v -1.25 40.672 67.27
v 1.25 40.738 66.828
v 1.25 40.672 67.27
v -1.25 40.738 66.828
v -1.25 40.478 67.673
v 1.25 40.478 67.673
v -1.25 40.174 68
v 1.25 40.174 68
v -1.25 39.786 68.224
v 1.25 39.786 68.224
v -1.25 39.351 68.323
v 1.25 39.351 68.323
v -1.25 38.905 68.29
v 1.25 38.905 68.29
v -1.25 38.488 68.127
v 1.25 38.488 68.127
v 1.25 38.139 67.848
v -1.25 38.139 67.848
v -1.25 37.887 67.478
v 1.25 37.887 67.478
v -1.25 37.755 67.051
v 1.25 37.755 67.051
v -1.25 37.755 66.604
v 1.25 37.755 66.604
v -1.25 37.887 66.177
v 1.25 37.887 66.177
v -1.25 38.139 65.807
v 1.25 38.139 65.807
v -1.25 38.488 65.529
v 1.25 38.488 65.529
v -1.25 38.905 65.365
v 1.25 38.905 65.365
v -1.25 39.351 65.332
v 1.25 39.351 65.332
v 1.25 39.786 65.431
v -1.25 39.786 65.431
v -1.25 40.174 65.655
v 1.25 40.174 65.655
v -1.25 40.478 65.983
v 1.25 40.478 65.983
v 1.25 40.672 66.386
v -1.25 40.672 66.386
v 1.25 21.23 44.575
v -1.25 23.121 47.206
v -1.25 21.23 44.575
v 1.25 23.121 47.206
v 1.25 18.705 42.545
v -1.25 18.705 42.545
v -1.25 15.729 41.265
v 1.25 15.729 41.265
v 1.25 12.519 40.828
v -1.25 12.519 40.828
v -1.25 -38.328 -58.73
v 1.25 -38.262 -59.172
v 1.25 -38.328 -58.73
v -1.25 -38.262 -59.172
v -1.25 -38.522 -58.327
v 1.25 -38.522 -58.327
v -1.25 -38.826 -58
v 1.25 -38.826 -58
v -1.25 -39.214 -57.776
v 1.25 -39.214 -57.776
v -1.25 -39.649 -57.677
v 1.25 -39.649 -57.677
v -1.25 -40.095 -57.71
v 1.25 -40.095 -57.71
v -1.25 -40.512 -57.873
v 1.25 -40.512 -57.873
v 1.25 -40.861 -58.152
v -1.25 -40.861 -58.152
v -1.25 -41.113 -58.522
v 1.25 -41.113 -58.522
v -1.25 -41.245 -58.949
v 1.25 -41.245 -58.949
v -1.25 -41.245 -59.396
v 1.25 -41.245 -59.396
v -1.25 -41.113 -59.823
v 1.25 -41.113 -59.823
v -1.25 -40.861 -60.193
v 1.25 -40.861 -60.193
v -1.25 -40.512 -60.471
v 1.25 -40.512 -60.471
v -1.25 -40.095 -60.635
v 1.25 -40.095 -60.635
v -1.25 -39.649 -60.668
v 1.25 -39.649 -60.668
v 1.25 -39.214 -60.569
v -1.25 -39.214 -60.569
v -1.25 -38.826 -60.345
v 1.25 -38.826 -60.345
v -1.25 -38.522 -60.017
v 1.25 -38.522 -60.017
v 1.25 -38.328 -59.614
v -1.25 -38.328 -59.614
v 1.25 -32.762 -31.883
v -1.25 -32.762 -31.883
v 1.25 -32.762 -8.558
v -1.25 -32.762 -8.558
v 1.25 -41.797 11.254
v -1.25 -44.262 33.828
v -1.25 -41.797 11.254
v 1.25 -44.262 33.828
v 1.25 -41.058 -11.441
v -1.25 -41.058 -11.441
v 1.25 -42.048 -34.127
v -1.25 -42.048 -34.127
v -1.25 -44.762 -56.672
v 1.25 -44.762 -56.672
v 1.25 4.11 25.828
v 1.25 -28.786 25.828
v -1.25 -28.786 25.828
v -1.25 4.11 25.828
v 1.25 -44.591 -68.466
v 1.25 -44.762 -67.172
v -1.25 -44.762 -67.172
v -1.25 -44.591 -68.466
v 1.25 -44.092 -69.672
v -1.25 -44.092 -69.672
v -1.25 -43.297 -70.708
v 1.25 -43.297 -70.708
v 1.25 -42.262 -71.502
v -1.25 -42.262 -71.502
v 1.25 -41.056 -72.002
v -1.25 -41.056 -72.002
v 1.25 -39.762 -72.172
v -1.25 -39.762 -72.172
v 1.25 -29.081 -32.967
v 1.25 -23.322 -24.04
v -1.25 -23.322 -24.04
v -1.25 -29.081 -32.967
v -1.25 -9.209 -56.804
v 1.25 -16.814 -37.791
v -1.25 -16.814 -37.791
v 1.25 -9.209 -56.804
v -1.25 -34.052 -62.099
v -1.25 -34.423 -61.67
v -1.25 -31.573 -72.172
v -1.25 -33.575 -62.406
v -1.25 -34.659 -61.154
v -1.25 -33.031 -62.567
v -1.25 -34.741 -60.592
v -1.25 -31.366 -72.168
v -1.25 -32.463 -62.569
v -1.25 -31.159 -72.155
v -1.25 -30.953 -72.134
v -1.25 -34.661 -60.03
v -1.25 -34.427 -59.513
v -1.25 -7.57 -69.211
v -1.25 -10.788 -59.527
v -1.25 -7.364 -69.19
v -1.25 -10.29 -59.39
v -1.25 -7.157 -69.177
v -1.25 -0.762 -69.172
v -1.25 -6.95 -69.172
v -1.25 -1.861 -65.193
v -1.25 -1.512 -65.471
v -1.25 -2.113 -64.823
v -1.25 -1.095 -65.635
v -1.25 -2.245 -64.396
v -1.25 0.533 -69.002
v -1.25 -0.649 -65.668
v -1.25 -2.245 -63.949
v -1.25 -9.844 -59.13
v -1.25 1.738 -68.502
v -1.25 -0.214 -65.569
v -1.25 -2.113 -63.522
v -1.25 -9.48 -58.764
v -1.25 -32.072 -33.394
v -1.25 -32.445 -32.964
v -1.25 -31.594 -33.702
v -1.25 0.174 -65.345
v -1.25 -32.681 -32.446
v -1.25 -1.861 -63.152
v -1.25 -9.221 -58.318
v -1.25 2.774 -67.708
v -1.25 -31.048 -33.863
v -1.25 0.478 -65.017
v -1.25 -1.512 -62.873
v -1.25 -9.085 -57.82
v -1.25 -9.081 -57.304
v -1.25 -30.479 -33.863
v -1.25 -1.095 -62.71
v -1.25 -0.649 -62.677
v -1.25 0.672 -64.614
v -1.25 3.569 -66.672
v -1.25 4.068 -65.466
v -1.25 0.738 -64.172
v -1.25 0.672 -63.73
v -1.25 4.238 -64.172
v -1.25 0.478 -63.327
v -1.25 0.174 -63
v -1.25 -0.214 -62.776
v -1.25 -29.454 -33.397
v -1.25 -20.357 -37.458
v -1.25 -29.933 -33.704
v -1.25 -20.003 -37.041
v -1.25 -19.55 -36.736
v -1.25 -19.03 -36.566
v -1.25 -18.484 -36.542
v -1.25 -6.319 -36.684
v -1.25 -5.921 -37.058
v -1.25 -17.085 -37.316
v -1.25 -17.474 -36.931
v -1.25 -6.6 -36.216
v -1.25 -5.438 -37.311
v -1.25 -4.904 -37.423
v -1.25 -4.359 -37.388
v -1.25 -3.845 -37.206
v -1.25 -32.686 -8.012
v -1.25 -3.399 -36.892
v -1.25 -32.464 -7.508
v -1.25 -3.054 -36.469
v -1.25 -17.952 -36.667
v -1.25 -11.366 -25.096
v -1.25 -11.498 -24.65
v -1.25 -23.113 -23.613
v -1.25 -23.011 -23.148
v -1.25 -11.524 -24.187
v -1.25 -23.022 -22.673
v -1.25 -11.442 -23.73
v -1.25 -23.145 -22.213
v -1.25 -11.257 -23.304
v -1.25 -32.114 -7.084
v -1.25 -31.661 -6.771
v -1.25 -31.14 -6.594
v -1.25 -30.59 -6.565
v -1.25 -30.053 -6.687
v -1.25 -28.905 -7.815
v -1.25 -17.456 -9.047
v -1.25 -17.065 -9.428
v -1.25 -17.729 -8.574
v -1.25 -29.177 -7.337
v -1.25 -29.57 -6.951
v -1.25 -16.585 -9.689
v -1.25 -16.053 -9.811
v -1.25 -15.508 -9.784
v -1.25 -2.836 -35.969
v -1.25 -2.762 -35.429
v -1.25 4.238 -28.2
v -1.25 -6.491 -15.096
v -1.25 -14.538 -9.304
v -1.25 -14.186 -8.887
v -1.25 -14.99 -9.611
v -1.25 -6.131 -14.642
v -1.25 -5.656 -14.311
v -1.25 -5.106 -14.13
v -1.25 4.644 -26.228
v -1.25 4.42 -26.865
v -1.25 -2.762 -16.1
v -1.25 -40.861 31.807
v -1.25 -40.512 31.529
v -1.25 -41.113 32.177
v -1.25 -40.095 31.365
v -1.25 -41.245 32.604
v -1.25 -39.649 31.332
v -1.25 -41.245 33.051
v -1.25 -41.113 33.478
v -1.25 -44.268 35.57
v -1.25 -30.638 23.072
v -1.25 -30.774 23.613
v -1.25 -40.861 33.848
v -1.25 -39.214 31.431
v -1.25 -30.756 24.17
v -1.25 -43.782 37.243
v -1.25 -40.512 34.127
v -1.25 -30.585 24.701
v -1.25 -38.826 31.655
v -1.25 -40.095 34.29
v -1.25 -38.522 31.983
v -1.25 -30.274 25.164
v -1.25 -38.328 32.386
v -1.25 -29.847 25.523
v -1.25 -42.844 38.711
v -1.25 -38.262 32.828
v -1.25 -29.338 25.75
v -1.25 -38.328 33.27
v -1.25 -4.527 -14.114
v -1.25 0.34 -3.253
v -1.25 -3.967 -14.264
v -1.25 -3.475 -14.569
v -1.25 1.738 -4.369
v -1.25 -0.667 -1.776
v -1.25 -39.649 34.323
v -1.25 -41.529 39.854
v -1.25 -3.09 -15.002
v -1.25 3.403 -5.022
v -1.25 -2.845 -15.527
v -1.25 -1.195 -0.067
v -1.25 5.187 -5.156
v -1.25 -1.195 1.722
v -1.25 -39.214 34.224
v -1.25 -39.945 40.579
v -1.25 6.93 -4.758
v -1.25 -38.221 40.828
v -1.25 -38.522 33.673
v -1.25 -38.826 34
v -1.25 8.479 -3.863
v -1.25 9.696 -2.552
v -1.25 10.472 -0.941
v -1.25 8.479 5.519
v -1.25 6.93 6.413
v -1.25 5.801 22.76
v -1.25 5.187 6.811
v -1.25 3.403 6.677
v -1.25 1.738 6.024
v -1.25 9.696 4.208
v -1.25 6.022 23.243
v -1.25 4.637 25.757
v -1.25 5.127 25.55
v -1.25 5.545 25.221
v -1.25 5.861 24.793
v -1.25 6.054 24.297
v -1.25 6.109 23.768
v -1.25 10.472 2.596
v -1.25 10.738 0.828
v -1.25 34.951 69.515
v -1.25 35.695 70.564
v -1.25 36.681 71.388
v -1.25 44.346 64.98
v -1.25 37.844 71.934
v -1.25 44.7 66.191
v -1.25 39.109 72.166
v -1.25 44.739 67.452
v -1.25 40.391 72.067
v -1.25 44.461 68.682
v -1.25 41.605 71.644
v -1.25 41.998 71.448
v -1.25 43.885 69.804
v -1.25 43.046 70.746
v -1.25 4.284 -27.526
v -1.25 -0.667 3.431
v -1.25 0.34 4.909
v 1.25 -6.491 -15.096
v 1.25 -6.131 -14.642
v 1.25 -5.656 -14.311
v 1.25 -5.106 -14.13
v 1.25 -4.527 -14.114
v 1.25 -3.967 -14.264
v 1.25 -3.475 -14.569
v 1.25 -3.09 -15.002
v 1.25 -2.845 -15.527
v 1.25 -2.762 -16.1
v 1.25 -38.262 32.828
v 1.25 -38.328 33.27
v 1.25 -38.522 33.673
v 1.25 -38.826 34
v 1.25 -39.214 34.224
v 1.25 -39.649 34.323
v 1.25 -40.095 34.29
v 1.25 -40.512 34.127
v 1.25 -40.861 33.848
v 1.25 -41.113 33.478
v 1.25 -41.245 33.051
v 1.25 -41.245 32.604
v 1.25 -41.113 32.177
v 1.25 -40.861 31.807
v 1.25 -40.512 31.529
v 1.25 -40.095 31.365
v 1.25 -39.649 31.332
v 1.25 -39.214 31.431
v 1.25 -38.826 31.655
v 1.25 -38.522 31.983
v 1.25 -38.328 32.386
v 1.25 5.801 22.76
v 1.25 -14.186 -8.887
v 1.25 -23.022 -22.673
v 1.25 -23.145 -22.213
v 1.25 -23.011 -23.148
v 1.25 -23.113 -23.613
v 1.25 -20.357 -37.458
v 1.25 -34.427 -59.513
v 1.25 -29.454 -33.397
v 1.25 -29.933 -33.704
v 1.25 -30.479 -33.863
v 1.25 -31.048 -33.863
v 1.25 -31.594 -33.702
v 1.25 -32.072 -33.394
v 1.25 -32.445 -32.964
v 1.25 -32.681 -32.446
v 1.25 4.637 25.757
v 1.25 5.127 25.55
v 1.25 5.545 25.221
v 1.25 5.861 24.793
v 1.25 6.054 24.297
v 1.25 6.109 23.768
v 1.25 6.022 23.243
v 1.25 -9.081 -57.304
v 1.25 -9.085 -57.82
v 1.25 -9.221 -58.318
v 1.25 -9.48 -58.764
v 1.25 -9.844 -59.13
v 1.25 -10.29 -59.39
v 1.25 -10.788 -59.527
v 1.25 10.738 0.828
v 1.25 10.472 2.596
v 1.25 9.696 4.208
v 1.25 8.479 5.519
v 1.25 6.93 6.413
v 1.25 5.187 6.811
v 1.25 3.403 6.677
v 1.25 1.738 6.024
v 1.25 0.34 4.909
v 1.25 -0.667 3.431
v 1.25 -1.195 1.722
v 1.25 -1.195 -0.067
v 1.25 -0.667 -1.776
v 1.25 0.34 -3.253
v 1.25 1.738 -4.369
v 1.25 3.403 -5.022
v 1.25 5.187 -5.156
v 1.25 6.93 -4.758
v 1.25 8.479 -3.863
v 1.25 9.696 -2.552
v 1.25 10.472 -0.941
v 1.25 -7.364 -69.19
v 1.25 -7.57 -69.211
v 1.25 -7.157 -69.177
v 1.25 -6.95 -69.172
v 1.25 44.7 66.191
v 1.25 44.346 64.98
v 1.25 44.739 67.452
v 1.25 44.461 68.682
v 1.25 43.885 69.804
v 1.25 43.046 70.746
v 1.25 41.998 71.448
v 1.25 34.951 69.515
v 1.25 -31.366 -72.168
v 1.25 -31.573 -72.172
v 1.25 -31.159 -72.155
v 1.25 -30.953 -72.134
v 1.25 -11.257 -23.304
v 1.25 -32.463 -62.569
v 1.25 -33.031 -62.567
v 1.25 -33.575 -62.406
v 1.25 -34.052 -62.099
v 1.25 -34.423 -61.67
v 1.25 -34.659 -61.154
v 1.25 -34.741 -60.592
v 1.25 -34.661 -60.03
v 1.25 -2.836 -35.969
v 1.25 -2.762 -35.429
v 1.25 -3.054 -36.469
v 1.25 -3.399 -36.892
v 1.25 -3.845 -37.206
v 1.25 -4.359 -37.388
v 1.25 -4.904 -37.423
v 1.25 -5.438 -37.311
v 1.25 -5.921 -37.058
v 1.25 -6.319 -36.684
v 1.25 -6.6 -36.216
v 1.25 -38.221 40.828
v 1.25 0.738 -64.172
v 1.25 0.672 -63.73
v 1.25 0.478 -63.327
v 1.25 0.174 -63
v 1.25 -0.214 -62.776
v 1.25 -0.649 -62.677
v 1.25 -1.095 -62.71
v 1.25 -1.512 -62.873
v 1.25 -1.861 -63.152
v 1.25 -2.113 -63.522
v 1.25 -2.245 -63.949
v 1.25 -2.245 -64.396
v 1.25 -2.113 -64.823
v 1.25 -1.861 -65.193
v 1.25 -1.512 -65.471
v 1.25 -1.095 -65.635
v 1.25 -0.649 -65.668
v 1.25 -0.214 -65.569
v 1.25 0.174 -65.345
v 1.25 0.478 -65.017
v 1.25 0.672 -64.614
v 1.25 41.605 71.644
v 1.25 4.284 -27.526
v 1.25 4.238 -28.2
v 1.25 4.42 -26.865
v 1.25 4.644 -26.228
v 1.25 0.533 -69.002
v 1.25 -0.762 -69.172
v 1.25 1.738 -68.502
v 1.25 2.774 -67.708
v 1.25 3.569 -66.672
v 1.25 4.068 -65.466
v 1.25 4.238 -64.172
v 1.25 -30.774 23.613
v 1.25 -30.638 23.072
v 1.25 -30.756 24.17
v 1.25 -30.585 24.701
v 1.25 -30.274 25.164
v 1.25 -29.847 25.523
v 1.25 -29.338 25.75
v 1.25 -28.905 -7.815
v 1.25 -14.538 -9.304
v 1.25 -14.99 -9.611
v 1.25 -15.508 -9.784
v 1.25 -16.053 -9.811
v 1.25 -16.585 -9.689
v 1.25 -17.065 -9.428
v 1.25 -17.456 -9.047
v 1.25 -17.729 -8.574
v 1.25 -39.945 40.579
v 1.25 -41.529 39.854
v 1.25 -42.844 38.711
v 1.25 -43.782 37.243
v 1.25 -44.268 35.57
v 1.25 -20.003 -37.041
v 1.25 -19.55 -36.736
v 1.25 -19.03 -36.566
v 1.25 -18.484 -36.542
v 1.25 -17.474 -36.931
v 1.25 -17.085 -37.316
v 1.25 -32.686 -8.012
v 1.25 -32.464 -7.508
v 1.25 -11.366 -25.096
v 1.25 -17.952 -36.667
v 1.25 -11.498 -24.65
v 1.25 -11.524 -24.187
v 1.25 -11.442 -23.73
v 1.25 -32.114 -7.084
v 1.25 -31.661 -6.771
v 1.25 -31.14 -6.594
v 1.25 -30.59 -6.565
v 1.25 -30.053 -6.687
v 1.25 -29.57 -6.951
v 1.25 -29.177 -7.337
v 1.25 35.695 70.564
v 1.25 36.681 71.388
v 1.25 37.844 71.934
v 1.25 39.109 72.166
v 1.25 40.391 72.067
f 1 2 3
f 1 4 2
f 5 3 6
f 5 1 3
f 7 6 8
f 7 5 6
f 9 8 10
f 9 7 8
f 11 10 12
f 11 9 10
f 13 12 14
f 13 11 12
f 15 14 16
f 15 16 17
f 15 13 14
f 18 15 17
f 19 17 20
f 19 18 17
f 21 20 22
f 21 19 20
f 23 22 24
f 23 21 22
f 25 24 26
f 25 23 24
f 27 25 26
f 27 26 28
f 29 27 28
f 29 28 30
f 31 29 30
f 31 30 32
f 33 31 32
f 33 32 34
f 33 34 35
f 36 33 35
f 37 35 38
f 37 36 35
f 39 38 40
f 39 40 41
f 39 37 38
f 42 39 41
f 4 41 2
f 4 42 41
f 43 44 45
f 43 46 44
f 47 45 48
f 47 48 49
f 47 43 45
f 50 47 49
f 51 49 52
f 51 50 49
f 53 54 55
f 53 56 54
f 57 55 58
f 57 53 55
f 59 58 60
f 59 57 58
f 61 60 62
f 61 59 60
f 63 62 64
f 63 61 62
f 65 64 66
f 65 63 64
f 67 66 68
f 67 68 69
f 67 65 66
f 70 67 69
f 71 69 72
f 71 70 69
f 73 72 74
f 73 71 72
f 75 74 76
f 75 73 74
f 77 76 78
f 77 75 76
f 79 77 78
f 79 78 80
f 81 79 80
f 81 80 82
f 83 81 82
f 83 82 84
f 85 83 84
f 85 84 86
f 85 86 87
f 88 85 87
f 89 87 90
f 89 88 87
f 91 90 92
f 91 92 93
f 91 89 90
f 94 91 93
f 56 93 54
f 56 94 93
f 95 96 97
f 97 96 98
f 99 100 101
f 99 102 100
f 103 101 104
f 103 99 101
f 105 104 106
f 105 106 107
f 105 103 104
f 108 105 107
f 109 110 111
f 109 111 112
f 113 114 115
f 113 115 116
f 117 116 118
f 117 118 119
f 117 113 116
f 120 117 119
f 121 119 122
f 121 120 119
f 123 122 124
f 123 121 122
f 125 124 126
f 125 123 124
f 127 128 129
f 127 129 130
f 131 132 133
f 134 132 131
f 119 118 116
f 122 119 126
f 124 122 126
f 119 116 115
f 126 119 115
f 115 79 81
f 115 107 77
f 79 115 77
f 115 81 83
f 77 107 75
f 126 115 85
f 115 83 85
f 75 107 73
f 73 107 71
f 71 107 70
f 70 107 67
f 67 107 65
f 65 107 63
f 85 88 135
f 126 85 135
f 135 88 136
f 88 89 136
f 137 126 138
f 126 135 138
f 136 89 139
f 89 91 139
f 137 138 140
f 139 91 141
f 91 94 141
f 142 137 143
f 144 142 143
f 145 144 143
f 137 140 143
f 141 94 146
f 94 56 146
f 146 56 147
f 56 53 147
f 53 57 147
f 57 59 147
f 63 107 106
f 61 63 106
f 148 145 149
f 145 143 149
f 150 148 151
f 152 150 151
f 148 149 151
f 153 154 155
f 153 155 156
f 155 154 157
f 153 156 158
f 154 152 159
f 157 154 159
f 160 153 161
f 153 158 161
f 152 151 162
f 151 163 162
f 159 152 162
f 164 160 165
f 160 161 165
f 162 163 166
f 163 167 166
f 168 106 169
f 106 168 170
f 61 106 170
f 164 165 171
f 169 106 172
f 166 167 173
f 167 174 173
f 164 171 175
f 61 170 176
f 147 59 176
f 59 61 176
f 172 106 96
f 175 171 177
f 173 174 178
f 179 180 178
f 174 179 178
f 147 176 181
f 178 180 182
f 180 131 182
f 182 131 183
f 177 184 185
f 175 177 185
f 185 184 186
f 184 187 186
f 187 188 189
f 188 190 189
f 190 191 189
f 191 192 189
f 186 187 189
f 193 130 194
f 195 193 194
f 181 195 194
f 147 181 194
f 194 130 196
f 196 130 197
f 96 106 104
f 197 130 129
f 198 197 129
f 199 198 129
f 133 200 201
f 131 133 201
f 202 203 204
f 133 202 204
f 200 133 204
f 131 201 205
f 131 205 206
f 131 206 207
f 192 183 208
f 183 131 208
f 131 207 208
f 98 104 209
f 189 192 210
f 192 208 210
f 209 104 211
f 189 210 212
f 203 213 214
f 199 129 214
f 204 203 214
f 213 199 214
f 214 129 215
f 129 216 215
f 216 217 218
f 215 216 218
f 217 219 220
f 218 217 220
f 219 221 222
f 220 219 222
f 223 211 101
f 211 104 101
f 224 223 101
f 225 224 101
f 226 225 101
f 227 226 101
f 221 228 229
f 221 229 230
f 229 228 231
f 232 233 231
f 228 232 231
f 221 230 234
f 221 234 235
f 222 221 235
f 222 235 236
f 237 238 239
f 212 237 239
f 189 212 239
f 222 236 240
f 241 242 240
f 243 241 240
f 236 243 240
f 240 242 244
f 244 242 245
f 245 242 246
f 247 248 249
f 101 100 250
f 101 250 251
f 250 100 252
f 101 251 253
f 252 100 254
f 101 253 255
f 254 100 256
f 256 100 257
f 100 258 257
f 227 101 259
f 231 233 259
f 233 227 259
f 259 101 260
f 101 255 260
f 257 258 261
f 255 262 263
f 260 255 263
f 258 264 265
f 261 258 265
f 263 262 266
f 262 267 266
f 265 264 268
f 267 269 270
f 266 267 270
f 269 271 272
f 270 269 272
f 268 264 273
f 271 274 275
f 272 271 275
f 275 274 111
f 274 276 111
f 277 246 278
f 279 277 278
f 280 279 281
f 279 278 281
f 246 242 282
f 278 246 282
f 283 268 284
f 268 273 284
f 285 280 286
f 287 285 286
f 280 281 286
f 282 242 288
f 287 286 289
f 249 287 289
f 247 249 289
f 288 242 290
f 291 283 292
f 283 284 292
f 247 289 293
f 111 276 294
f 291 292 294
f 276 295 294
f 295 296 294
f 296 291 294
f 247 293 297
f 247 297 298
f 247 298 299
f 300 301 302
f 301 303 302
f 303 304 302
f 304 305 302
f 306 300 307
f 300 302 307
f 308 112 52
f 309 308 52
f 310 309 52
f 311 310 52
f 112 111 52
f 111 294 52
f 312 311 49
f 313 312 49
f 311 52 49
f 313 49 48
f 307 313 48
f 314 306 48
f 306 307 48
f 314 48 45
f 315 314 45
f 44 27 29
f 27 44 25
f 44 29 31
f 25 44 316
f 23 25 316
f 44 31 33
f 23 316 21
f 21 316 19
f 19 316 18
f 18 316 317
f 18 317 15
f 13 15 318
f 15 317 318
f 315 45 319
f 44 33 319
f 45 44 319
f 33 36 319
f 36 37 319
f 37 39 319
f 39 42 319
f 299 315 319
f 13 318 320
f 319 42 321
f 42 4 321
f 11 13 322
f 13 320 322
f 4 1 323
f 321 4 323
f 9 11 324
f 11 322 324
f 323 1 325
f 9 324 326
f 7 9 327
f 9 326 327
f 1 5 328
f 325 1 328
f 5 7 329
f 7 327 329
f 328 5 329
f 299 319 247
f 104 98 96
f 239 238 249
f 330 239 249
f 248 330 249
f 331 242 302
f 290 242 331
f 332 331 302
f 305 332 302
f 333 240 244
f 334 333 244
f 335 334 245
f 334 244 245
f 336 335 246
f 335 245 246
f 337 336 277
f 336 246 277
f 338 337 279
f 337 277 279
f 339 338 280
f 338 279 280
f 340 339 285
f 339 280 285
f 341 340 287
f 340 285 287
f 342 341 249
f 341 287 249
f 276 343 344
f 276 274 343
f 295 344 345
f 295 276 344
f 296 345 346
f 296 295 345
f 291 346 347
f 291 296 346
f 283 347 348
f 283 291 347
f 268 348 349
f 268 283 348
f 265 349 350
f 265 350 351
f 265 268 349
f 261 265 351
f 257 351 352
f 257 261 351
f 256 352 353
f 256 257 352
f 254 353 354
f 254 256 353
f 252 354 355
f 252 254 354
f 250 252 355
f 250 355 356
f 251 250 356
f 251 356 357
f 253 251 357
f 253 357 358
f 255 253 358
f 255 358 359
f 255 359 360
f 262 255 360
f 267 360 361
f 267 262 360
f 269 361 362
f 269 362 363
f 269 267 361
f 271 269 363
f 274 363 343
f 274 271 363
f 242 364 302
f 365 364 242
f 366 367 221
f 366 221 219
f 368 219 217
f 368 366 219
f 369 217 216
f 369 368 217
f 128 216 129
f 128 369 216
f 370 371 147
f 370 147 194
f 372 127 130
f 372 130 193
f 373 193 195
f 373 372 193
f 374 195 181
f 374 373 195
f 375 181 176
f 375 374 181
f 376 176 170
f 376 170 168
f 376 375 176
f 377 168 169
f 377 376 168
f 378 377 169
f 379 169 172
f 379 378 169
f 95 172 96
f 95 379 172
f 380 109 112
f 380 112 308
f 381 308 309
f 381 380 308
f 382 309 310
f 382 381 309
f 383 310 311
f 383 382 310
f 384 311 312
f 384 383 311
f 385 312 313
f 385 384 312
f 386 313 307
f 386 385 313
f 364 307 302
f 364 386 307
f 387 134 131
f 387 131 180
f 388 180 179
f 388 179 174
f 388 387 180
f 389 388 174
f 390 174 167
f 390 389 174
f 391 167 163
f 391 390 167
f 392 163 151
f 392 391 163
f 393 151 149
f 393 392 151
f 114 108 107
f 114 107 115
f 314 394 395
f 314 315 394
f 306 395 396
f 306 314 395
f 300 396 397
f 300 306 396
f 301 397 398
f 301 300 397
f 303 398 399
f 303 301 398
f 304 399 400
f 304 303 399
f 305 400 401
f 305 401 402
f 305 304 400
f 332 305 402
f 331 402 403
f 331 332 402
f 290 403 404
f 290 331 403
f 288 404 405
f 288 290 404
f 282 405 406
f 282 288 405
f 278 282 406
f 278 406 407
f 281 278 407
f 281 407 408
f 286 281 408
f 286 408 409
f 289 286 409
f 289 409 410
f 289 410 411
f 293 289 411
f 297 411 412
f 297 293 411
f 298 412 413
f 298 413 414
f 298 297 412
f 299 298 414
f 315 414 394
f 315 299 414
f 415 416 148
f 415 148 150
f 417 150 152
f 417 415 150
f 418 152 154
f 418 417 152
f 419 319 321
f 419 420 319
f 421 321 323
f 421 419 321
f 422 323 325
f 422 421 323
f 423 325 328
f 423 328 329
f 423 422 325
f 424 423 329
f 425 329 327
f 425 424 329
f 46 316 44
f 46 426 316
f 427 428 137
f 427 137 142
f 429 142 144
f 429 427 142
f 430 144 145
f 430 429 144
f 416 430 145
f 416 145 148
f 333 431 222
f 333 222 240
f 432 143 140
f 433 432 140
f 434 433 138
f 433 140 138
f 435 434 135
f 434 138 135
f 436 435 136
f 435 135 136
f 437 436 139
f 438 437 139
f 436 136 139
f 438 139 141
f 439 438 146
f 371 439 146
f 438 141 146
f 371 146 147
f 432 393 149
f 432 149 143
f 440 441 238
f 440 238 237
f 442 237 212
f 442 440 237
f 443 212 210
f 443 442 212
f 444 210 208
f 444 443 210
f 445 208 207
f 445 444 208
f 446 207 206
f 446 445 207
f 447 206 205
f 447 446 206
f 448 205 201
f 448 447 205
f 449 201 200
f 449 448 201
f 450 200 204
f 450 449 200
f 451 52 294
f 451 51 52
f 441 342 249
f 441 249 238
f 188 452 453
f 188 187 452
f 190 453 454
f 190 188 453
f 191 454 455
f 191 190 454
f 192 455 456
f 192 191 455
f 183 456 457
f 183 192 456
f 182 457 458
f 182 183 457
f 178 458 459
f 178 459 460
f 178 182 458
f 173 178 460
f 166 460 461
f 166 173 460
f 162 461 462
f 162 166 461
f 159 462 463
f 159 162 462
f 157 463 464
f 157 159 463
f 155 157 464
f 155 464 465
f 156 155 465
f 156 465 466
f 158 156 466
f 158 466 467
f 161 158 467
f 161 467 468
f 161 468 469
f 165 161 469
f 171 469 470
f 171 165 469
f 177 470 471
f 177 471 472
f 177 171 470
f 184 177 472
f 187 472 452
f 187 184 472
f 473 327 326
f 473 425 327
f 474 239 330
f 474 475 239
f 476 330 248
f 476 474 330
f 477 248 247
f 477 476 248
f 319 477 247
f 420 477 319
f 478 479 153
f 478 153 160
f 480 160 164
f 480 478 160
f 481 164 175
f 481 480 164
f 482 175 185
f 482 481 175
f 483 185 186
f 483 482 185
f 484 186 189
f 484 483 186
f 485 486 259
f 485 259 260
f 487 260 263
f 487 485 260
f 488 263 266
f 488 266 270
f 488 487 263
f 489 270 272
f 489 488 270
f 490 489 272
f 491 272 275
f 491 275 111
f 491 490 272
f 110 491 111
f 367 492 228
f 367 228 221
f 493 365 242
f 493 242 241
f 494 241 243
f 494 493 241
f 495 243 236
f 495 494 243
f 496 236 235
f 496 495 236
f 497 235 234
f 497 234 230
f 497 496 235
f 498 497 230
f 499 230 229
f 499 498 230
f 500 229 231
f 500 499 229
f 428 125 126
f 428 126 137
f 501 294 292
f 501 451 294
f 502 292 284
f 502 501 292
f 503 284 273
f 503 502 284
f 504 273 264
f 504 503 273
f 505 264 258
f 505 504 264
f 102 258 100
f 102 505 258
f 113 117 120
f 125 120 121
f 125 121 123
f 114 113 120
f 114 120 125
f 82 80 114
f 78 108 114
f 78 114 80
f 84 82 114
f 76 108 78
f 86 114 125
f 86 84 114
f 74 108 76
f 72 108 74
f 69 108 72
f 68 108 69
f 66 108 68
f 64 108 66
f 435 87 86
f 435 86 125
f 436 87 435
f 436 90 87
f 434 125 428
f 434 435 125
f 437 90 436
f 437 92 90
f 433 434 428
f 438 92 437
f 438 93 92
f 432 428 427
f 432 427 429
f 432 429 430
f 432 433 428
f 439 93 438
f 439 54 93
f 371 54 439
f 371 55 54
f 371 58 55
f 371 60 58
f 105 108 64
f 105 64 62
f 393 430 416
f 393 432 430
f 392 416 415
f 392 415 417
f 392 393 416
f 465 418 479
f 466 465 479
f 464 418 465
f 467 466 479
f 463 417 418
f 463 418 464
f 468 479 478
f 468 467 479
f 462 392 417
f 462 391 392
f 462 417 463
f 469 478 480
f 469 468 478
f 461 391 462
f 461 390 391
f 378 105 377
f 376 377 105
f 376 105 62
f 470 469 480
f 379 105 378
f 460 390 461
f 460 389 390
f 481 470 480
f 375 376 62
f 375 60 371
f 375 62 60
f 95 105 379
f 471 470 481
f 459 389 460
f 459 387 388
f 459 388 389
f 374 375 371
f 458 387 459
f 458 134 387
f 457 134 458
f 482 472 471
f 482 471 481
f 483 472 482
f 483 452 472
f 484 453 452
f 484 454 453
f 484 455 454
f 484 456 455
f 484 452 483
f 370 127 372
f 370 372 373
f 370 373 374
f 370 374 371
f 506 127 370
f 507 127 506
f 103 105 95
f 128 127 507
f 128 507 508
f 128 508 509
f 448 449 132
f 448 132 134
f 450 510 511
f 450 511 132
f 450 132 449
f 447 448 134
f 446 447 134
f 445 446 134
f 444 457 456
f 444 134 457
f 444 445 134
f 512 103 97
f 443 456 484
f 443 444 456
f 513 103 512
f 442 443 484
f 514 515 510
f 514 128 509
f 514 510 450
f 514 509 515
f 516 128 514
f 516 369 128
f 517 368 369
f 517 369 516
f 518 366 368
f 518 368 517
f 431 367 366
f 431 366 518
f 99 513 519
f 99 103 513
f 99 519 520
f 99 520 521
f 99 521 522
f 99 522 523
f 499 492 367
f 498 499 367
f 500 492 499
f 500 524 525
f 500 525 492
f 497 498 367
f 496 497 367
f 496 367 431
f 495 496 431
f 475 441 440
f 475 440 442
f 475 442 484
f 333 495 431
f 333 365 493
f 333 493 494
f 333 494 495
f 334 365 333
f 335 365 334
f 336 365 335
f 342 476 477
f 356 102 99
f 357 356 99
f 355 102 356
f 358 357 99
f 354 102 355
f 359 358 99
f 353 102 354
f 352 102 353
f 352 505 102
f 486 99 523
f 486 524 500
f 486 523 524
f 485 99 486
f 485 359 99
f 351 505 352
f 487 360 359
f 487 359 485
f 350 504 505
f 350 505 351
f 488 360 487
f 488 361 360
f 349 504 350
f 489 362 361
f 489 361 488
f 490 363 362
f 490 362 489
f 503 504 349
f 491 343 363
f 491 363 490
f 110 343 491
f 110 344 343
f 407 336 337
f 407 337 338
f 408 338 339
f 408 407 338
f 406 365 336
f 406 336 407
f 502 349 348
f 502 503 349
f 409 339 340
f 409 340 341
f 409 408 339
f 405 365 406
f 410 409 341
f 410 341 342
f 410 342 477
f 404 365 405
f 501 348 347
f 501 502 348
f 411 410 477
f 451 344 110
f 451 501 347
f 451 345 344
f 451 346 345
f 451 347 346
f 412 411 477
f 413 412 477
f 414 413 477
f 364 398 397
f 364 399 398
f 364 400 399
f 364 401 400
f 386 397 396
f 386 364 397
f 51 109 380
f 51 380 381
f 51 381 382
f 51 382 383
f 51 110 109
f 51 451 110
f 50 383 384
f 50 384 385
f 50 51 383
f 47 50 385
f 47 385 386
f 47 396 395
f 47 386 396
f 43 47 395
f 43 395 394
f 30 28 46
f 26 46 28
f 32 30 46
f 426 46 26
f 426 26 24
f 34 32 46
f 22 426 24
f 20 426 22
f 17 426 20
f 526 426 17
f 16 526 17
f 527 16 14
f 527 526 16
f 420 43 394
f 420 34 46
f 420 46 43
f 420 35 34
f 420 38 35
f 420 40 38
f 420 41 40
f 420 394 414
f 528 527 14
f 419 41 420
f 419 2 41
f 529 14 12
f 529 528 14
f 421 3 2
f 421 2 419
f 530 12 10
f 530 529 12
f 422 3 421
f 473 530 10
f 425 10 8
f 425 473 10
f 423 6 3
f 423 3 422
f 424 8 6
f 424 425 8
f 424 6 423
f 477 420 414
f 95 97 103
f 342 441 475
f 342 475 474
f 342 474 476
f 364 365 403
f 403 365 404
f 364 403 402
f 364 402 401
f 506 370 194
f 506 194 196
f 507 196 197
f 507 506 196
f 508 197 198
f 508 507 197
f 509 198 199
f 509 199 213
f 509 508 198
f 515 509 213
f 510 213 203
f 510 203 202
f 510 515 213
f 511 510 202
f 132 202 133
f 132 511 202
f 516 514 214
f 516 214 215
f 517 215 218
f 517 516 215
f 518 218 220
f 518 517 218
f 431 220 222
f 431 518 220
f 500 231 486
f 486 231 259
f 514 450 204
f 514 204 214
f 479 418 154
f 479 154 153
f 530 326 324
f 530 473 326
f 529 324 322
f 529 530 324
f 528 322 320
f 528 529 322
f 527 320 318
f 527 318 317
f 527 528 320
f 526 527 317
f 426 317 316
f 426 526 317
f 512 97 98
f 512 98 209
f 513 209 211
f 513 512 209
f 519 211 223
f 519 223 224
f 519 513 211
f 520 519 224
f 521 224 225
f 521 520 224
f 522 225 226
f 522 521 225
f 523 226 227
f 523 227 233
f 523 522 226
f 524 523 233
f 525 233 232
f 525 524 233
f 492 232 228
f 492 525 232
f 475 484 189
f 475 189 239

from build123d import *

# Parameters (mm, degrees)
F0_R     = 1.5
F0_R_2   = 6
F1_DEPTH = 1.25


# Not quite as in the source:
# - ends of sketch curves that miss each other by under 0.0002 mm in the source are joined


with BuildPart() as f1:
    # F0 (on Right) → F1 (new body, symmetric)
    with BuildSketch(Plane.YZ):
        with BuildLine():
            ThreePointArc((-44.2615727709, 33.8276430339), (-41.0580126337, -11.4414374496), (-44.7615726272, -56.6723570594))
            Line((-44.7615726272, -56.6723570594), (-44.761573, -67.172357))
            ThreePointArc((-44.761573, -67.172357), (-43.2971069059, -70.7078909059), (-39.761573, -72.172357))
            Line((-39.761573, -72.172357), (-31.572862, -72.172357))
            ThreePointArc((-31.572862, -72.172357), (-31.2621746065, -72.1626949989), (-30.9526879578, -72.1337463374))
            Line((-30.9526879578, -72.1337463374), (-7.570458, -69.210968))
            ThreePointArc((-7.570458, -69.210968), (-7.2609713935, -69.1820190011), (-6.950284, -69.172357))
            Line((-6.950284, -69.172357), (-0.761573, -69.172357))
            ThreePointArc((-0.761573, -69.172357), (2.7739609059, -67.7078909059), (4.238427, -64.172357))
            Line((4.238427, -64.172357), (4.238427, -28.200354))
            ThreePointArc((4.238427, -28.200354), (4.340868282, -27.1934187471), (4.6439944414, -26.2277441895))
            Line((4.6439944414, -26.2277441895), (44.34607, 64.980308))
            ThreePointArc((44.34607, 64.980308), (44.4613498885, 68.6823868), (41.9976409775, 71.448035955))
            Line((41.9976409775, 71.448035955), (41.604729, 71.644492))
            ThreePointArc((41.604729, 71.644492), (37.8444305073, 71.9343641274), (34.9513503203, 69.5148688301))
            Line((34.9513503203, 69.5148688301), (23.120683, 47.205611))
            ThreePointArc((23.120683, 47.205611), (18.7052359642, 42.5450269916), (12.519138, 40.827643))
            Line((12.519138, 40.827643), (-38.220653, 40.827643))
            ThreePointArc((-38.220653, 40.827643), (-42.8437667533, 38.710714686), (-44.2615727709, 33.8276430339))
        make_face()
        with Locations((-39.761573, -59.172357)):
            Circle(F0_R, mode=Mode.SUBTRACT)
        with Locations((-0.761573, -64.172357)):
            Circle(F0_R, mode=Mode.SUBTRACT)
        with BuildLine():
            ThreePointArc((-9.2090828941, -56.8035819576), (-9.3358141293, -58.5495251427), (-10.7880590013, -59.5269519905))
            Line((-10.7880590013, -59.5269519905), (-32.462939, -62.56904))
            ThreePointArc((-32.462939, -62.56904), (-34.4234257272, -61.6697294934), (-34.4270410919, -59.5128209413))
            Line((-34.4270410919, -59.5128209413), (-20.357382, -37.45768))
            ThreePointArc((-20.357382, -37.45768), (-18.4841932611, -36.5420784276), (-16.8143035493, -37.7905298197))
            Line((-16.8143035493, -37.7905298197), (-9.2090828941, -56.8035819576))
        make_face(mode=Mode.SUBTRACT)
        with BuildLine():
            Line((-23.321557, -24.040332), (-29.08098, -32.967437))
            ThreePointArc((-29.08098, -32.967437), (-31.3267335557, -33.8016713068), (-32.761573, -31.883184))
            Line((-32.761573, -31.883184), (-32.761573, -8.557522))
            ThreePointArc((-32.761573, -8.557522), (-31.139788407, -6.5936092968), (-28.9046198941, -7.8147399576))
            Line((-28.9046198941, -7.8147399576), (-23.145197, -22.213297))
            ThreePointArc((-23.145197, -22.213297), (-23.0114029888, -23.1482412686), (-23.321557, -24.040332))
        make_face(mode=Mode.SUBTRACT)
        with BuildLine():
            ThreePointArc((-11.3658482669, -25.0957141144), (-11.5238882865, -24.1867752684), (-11.2571359352, -23.3036050376))
            Line((-11.2571359352, -23.3036050376), (-6.491151, -15.095519))
            ThreePointArc((-6.491151, -15.095519), (-4.2415517843, -14.1685784799), (-2.761573, -16.09979))
            Line((-2.761573, -16.09979), (-2.761573, -35.428508))
            ThreePointArc((-2.761573, -35.428508), (-4.3594410625, -37.387663406), (-6.5998629049, -36.2163469592))
            Line((-6.5998629049, -36.2163469592), (-11.3658482669, -25.0957141144))
        make_face(mode=Mode.SUBTRACT)
        with Locations((-39.761573, 32.827643)):
            Circle(F0_R, mode=Mode.SUBTRACT)
        with BuildLine():
            Line((5.800752, 22.759657), (-14.186435, -8.886721))
            ThreePointArc((-14.186435, -8.886721), (-16.0532082809, -9.8109940241), (-17.7292820906, -8.574103037))
            Line((-17.7292820906, -8.574103037), (-30.637673, 23.072275))
            ThreePointArc((-30.637673, 23.072275), (-30.4457341301, 24.9432737467), (-28.785804, 25.827643))
            Line((-28.785804, 25.827643), (4.109774, 25.827643))
            ThreePointArc((4.109774, 25.827643), (5.8613407009, 24.7930517696), (5.800752, 22.759657))
        make_face(mode=Mode.SUBTRACT)
        with Locations((4.738427, 0.827643)):
            Circle(F0_R_2, mode=Mode.SUBTRACT)
        with Locations((39.238427, 66.827643)):
            Circle(F0_R, mode=Mode.SUBTRACT)
    extrude(amount=F1_DEPTH, both=True)


solid = f1.part
